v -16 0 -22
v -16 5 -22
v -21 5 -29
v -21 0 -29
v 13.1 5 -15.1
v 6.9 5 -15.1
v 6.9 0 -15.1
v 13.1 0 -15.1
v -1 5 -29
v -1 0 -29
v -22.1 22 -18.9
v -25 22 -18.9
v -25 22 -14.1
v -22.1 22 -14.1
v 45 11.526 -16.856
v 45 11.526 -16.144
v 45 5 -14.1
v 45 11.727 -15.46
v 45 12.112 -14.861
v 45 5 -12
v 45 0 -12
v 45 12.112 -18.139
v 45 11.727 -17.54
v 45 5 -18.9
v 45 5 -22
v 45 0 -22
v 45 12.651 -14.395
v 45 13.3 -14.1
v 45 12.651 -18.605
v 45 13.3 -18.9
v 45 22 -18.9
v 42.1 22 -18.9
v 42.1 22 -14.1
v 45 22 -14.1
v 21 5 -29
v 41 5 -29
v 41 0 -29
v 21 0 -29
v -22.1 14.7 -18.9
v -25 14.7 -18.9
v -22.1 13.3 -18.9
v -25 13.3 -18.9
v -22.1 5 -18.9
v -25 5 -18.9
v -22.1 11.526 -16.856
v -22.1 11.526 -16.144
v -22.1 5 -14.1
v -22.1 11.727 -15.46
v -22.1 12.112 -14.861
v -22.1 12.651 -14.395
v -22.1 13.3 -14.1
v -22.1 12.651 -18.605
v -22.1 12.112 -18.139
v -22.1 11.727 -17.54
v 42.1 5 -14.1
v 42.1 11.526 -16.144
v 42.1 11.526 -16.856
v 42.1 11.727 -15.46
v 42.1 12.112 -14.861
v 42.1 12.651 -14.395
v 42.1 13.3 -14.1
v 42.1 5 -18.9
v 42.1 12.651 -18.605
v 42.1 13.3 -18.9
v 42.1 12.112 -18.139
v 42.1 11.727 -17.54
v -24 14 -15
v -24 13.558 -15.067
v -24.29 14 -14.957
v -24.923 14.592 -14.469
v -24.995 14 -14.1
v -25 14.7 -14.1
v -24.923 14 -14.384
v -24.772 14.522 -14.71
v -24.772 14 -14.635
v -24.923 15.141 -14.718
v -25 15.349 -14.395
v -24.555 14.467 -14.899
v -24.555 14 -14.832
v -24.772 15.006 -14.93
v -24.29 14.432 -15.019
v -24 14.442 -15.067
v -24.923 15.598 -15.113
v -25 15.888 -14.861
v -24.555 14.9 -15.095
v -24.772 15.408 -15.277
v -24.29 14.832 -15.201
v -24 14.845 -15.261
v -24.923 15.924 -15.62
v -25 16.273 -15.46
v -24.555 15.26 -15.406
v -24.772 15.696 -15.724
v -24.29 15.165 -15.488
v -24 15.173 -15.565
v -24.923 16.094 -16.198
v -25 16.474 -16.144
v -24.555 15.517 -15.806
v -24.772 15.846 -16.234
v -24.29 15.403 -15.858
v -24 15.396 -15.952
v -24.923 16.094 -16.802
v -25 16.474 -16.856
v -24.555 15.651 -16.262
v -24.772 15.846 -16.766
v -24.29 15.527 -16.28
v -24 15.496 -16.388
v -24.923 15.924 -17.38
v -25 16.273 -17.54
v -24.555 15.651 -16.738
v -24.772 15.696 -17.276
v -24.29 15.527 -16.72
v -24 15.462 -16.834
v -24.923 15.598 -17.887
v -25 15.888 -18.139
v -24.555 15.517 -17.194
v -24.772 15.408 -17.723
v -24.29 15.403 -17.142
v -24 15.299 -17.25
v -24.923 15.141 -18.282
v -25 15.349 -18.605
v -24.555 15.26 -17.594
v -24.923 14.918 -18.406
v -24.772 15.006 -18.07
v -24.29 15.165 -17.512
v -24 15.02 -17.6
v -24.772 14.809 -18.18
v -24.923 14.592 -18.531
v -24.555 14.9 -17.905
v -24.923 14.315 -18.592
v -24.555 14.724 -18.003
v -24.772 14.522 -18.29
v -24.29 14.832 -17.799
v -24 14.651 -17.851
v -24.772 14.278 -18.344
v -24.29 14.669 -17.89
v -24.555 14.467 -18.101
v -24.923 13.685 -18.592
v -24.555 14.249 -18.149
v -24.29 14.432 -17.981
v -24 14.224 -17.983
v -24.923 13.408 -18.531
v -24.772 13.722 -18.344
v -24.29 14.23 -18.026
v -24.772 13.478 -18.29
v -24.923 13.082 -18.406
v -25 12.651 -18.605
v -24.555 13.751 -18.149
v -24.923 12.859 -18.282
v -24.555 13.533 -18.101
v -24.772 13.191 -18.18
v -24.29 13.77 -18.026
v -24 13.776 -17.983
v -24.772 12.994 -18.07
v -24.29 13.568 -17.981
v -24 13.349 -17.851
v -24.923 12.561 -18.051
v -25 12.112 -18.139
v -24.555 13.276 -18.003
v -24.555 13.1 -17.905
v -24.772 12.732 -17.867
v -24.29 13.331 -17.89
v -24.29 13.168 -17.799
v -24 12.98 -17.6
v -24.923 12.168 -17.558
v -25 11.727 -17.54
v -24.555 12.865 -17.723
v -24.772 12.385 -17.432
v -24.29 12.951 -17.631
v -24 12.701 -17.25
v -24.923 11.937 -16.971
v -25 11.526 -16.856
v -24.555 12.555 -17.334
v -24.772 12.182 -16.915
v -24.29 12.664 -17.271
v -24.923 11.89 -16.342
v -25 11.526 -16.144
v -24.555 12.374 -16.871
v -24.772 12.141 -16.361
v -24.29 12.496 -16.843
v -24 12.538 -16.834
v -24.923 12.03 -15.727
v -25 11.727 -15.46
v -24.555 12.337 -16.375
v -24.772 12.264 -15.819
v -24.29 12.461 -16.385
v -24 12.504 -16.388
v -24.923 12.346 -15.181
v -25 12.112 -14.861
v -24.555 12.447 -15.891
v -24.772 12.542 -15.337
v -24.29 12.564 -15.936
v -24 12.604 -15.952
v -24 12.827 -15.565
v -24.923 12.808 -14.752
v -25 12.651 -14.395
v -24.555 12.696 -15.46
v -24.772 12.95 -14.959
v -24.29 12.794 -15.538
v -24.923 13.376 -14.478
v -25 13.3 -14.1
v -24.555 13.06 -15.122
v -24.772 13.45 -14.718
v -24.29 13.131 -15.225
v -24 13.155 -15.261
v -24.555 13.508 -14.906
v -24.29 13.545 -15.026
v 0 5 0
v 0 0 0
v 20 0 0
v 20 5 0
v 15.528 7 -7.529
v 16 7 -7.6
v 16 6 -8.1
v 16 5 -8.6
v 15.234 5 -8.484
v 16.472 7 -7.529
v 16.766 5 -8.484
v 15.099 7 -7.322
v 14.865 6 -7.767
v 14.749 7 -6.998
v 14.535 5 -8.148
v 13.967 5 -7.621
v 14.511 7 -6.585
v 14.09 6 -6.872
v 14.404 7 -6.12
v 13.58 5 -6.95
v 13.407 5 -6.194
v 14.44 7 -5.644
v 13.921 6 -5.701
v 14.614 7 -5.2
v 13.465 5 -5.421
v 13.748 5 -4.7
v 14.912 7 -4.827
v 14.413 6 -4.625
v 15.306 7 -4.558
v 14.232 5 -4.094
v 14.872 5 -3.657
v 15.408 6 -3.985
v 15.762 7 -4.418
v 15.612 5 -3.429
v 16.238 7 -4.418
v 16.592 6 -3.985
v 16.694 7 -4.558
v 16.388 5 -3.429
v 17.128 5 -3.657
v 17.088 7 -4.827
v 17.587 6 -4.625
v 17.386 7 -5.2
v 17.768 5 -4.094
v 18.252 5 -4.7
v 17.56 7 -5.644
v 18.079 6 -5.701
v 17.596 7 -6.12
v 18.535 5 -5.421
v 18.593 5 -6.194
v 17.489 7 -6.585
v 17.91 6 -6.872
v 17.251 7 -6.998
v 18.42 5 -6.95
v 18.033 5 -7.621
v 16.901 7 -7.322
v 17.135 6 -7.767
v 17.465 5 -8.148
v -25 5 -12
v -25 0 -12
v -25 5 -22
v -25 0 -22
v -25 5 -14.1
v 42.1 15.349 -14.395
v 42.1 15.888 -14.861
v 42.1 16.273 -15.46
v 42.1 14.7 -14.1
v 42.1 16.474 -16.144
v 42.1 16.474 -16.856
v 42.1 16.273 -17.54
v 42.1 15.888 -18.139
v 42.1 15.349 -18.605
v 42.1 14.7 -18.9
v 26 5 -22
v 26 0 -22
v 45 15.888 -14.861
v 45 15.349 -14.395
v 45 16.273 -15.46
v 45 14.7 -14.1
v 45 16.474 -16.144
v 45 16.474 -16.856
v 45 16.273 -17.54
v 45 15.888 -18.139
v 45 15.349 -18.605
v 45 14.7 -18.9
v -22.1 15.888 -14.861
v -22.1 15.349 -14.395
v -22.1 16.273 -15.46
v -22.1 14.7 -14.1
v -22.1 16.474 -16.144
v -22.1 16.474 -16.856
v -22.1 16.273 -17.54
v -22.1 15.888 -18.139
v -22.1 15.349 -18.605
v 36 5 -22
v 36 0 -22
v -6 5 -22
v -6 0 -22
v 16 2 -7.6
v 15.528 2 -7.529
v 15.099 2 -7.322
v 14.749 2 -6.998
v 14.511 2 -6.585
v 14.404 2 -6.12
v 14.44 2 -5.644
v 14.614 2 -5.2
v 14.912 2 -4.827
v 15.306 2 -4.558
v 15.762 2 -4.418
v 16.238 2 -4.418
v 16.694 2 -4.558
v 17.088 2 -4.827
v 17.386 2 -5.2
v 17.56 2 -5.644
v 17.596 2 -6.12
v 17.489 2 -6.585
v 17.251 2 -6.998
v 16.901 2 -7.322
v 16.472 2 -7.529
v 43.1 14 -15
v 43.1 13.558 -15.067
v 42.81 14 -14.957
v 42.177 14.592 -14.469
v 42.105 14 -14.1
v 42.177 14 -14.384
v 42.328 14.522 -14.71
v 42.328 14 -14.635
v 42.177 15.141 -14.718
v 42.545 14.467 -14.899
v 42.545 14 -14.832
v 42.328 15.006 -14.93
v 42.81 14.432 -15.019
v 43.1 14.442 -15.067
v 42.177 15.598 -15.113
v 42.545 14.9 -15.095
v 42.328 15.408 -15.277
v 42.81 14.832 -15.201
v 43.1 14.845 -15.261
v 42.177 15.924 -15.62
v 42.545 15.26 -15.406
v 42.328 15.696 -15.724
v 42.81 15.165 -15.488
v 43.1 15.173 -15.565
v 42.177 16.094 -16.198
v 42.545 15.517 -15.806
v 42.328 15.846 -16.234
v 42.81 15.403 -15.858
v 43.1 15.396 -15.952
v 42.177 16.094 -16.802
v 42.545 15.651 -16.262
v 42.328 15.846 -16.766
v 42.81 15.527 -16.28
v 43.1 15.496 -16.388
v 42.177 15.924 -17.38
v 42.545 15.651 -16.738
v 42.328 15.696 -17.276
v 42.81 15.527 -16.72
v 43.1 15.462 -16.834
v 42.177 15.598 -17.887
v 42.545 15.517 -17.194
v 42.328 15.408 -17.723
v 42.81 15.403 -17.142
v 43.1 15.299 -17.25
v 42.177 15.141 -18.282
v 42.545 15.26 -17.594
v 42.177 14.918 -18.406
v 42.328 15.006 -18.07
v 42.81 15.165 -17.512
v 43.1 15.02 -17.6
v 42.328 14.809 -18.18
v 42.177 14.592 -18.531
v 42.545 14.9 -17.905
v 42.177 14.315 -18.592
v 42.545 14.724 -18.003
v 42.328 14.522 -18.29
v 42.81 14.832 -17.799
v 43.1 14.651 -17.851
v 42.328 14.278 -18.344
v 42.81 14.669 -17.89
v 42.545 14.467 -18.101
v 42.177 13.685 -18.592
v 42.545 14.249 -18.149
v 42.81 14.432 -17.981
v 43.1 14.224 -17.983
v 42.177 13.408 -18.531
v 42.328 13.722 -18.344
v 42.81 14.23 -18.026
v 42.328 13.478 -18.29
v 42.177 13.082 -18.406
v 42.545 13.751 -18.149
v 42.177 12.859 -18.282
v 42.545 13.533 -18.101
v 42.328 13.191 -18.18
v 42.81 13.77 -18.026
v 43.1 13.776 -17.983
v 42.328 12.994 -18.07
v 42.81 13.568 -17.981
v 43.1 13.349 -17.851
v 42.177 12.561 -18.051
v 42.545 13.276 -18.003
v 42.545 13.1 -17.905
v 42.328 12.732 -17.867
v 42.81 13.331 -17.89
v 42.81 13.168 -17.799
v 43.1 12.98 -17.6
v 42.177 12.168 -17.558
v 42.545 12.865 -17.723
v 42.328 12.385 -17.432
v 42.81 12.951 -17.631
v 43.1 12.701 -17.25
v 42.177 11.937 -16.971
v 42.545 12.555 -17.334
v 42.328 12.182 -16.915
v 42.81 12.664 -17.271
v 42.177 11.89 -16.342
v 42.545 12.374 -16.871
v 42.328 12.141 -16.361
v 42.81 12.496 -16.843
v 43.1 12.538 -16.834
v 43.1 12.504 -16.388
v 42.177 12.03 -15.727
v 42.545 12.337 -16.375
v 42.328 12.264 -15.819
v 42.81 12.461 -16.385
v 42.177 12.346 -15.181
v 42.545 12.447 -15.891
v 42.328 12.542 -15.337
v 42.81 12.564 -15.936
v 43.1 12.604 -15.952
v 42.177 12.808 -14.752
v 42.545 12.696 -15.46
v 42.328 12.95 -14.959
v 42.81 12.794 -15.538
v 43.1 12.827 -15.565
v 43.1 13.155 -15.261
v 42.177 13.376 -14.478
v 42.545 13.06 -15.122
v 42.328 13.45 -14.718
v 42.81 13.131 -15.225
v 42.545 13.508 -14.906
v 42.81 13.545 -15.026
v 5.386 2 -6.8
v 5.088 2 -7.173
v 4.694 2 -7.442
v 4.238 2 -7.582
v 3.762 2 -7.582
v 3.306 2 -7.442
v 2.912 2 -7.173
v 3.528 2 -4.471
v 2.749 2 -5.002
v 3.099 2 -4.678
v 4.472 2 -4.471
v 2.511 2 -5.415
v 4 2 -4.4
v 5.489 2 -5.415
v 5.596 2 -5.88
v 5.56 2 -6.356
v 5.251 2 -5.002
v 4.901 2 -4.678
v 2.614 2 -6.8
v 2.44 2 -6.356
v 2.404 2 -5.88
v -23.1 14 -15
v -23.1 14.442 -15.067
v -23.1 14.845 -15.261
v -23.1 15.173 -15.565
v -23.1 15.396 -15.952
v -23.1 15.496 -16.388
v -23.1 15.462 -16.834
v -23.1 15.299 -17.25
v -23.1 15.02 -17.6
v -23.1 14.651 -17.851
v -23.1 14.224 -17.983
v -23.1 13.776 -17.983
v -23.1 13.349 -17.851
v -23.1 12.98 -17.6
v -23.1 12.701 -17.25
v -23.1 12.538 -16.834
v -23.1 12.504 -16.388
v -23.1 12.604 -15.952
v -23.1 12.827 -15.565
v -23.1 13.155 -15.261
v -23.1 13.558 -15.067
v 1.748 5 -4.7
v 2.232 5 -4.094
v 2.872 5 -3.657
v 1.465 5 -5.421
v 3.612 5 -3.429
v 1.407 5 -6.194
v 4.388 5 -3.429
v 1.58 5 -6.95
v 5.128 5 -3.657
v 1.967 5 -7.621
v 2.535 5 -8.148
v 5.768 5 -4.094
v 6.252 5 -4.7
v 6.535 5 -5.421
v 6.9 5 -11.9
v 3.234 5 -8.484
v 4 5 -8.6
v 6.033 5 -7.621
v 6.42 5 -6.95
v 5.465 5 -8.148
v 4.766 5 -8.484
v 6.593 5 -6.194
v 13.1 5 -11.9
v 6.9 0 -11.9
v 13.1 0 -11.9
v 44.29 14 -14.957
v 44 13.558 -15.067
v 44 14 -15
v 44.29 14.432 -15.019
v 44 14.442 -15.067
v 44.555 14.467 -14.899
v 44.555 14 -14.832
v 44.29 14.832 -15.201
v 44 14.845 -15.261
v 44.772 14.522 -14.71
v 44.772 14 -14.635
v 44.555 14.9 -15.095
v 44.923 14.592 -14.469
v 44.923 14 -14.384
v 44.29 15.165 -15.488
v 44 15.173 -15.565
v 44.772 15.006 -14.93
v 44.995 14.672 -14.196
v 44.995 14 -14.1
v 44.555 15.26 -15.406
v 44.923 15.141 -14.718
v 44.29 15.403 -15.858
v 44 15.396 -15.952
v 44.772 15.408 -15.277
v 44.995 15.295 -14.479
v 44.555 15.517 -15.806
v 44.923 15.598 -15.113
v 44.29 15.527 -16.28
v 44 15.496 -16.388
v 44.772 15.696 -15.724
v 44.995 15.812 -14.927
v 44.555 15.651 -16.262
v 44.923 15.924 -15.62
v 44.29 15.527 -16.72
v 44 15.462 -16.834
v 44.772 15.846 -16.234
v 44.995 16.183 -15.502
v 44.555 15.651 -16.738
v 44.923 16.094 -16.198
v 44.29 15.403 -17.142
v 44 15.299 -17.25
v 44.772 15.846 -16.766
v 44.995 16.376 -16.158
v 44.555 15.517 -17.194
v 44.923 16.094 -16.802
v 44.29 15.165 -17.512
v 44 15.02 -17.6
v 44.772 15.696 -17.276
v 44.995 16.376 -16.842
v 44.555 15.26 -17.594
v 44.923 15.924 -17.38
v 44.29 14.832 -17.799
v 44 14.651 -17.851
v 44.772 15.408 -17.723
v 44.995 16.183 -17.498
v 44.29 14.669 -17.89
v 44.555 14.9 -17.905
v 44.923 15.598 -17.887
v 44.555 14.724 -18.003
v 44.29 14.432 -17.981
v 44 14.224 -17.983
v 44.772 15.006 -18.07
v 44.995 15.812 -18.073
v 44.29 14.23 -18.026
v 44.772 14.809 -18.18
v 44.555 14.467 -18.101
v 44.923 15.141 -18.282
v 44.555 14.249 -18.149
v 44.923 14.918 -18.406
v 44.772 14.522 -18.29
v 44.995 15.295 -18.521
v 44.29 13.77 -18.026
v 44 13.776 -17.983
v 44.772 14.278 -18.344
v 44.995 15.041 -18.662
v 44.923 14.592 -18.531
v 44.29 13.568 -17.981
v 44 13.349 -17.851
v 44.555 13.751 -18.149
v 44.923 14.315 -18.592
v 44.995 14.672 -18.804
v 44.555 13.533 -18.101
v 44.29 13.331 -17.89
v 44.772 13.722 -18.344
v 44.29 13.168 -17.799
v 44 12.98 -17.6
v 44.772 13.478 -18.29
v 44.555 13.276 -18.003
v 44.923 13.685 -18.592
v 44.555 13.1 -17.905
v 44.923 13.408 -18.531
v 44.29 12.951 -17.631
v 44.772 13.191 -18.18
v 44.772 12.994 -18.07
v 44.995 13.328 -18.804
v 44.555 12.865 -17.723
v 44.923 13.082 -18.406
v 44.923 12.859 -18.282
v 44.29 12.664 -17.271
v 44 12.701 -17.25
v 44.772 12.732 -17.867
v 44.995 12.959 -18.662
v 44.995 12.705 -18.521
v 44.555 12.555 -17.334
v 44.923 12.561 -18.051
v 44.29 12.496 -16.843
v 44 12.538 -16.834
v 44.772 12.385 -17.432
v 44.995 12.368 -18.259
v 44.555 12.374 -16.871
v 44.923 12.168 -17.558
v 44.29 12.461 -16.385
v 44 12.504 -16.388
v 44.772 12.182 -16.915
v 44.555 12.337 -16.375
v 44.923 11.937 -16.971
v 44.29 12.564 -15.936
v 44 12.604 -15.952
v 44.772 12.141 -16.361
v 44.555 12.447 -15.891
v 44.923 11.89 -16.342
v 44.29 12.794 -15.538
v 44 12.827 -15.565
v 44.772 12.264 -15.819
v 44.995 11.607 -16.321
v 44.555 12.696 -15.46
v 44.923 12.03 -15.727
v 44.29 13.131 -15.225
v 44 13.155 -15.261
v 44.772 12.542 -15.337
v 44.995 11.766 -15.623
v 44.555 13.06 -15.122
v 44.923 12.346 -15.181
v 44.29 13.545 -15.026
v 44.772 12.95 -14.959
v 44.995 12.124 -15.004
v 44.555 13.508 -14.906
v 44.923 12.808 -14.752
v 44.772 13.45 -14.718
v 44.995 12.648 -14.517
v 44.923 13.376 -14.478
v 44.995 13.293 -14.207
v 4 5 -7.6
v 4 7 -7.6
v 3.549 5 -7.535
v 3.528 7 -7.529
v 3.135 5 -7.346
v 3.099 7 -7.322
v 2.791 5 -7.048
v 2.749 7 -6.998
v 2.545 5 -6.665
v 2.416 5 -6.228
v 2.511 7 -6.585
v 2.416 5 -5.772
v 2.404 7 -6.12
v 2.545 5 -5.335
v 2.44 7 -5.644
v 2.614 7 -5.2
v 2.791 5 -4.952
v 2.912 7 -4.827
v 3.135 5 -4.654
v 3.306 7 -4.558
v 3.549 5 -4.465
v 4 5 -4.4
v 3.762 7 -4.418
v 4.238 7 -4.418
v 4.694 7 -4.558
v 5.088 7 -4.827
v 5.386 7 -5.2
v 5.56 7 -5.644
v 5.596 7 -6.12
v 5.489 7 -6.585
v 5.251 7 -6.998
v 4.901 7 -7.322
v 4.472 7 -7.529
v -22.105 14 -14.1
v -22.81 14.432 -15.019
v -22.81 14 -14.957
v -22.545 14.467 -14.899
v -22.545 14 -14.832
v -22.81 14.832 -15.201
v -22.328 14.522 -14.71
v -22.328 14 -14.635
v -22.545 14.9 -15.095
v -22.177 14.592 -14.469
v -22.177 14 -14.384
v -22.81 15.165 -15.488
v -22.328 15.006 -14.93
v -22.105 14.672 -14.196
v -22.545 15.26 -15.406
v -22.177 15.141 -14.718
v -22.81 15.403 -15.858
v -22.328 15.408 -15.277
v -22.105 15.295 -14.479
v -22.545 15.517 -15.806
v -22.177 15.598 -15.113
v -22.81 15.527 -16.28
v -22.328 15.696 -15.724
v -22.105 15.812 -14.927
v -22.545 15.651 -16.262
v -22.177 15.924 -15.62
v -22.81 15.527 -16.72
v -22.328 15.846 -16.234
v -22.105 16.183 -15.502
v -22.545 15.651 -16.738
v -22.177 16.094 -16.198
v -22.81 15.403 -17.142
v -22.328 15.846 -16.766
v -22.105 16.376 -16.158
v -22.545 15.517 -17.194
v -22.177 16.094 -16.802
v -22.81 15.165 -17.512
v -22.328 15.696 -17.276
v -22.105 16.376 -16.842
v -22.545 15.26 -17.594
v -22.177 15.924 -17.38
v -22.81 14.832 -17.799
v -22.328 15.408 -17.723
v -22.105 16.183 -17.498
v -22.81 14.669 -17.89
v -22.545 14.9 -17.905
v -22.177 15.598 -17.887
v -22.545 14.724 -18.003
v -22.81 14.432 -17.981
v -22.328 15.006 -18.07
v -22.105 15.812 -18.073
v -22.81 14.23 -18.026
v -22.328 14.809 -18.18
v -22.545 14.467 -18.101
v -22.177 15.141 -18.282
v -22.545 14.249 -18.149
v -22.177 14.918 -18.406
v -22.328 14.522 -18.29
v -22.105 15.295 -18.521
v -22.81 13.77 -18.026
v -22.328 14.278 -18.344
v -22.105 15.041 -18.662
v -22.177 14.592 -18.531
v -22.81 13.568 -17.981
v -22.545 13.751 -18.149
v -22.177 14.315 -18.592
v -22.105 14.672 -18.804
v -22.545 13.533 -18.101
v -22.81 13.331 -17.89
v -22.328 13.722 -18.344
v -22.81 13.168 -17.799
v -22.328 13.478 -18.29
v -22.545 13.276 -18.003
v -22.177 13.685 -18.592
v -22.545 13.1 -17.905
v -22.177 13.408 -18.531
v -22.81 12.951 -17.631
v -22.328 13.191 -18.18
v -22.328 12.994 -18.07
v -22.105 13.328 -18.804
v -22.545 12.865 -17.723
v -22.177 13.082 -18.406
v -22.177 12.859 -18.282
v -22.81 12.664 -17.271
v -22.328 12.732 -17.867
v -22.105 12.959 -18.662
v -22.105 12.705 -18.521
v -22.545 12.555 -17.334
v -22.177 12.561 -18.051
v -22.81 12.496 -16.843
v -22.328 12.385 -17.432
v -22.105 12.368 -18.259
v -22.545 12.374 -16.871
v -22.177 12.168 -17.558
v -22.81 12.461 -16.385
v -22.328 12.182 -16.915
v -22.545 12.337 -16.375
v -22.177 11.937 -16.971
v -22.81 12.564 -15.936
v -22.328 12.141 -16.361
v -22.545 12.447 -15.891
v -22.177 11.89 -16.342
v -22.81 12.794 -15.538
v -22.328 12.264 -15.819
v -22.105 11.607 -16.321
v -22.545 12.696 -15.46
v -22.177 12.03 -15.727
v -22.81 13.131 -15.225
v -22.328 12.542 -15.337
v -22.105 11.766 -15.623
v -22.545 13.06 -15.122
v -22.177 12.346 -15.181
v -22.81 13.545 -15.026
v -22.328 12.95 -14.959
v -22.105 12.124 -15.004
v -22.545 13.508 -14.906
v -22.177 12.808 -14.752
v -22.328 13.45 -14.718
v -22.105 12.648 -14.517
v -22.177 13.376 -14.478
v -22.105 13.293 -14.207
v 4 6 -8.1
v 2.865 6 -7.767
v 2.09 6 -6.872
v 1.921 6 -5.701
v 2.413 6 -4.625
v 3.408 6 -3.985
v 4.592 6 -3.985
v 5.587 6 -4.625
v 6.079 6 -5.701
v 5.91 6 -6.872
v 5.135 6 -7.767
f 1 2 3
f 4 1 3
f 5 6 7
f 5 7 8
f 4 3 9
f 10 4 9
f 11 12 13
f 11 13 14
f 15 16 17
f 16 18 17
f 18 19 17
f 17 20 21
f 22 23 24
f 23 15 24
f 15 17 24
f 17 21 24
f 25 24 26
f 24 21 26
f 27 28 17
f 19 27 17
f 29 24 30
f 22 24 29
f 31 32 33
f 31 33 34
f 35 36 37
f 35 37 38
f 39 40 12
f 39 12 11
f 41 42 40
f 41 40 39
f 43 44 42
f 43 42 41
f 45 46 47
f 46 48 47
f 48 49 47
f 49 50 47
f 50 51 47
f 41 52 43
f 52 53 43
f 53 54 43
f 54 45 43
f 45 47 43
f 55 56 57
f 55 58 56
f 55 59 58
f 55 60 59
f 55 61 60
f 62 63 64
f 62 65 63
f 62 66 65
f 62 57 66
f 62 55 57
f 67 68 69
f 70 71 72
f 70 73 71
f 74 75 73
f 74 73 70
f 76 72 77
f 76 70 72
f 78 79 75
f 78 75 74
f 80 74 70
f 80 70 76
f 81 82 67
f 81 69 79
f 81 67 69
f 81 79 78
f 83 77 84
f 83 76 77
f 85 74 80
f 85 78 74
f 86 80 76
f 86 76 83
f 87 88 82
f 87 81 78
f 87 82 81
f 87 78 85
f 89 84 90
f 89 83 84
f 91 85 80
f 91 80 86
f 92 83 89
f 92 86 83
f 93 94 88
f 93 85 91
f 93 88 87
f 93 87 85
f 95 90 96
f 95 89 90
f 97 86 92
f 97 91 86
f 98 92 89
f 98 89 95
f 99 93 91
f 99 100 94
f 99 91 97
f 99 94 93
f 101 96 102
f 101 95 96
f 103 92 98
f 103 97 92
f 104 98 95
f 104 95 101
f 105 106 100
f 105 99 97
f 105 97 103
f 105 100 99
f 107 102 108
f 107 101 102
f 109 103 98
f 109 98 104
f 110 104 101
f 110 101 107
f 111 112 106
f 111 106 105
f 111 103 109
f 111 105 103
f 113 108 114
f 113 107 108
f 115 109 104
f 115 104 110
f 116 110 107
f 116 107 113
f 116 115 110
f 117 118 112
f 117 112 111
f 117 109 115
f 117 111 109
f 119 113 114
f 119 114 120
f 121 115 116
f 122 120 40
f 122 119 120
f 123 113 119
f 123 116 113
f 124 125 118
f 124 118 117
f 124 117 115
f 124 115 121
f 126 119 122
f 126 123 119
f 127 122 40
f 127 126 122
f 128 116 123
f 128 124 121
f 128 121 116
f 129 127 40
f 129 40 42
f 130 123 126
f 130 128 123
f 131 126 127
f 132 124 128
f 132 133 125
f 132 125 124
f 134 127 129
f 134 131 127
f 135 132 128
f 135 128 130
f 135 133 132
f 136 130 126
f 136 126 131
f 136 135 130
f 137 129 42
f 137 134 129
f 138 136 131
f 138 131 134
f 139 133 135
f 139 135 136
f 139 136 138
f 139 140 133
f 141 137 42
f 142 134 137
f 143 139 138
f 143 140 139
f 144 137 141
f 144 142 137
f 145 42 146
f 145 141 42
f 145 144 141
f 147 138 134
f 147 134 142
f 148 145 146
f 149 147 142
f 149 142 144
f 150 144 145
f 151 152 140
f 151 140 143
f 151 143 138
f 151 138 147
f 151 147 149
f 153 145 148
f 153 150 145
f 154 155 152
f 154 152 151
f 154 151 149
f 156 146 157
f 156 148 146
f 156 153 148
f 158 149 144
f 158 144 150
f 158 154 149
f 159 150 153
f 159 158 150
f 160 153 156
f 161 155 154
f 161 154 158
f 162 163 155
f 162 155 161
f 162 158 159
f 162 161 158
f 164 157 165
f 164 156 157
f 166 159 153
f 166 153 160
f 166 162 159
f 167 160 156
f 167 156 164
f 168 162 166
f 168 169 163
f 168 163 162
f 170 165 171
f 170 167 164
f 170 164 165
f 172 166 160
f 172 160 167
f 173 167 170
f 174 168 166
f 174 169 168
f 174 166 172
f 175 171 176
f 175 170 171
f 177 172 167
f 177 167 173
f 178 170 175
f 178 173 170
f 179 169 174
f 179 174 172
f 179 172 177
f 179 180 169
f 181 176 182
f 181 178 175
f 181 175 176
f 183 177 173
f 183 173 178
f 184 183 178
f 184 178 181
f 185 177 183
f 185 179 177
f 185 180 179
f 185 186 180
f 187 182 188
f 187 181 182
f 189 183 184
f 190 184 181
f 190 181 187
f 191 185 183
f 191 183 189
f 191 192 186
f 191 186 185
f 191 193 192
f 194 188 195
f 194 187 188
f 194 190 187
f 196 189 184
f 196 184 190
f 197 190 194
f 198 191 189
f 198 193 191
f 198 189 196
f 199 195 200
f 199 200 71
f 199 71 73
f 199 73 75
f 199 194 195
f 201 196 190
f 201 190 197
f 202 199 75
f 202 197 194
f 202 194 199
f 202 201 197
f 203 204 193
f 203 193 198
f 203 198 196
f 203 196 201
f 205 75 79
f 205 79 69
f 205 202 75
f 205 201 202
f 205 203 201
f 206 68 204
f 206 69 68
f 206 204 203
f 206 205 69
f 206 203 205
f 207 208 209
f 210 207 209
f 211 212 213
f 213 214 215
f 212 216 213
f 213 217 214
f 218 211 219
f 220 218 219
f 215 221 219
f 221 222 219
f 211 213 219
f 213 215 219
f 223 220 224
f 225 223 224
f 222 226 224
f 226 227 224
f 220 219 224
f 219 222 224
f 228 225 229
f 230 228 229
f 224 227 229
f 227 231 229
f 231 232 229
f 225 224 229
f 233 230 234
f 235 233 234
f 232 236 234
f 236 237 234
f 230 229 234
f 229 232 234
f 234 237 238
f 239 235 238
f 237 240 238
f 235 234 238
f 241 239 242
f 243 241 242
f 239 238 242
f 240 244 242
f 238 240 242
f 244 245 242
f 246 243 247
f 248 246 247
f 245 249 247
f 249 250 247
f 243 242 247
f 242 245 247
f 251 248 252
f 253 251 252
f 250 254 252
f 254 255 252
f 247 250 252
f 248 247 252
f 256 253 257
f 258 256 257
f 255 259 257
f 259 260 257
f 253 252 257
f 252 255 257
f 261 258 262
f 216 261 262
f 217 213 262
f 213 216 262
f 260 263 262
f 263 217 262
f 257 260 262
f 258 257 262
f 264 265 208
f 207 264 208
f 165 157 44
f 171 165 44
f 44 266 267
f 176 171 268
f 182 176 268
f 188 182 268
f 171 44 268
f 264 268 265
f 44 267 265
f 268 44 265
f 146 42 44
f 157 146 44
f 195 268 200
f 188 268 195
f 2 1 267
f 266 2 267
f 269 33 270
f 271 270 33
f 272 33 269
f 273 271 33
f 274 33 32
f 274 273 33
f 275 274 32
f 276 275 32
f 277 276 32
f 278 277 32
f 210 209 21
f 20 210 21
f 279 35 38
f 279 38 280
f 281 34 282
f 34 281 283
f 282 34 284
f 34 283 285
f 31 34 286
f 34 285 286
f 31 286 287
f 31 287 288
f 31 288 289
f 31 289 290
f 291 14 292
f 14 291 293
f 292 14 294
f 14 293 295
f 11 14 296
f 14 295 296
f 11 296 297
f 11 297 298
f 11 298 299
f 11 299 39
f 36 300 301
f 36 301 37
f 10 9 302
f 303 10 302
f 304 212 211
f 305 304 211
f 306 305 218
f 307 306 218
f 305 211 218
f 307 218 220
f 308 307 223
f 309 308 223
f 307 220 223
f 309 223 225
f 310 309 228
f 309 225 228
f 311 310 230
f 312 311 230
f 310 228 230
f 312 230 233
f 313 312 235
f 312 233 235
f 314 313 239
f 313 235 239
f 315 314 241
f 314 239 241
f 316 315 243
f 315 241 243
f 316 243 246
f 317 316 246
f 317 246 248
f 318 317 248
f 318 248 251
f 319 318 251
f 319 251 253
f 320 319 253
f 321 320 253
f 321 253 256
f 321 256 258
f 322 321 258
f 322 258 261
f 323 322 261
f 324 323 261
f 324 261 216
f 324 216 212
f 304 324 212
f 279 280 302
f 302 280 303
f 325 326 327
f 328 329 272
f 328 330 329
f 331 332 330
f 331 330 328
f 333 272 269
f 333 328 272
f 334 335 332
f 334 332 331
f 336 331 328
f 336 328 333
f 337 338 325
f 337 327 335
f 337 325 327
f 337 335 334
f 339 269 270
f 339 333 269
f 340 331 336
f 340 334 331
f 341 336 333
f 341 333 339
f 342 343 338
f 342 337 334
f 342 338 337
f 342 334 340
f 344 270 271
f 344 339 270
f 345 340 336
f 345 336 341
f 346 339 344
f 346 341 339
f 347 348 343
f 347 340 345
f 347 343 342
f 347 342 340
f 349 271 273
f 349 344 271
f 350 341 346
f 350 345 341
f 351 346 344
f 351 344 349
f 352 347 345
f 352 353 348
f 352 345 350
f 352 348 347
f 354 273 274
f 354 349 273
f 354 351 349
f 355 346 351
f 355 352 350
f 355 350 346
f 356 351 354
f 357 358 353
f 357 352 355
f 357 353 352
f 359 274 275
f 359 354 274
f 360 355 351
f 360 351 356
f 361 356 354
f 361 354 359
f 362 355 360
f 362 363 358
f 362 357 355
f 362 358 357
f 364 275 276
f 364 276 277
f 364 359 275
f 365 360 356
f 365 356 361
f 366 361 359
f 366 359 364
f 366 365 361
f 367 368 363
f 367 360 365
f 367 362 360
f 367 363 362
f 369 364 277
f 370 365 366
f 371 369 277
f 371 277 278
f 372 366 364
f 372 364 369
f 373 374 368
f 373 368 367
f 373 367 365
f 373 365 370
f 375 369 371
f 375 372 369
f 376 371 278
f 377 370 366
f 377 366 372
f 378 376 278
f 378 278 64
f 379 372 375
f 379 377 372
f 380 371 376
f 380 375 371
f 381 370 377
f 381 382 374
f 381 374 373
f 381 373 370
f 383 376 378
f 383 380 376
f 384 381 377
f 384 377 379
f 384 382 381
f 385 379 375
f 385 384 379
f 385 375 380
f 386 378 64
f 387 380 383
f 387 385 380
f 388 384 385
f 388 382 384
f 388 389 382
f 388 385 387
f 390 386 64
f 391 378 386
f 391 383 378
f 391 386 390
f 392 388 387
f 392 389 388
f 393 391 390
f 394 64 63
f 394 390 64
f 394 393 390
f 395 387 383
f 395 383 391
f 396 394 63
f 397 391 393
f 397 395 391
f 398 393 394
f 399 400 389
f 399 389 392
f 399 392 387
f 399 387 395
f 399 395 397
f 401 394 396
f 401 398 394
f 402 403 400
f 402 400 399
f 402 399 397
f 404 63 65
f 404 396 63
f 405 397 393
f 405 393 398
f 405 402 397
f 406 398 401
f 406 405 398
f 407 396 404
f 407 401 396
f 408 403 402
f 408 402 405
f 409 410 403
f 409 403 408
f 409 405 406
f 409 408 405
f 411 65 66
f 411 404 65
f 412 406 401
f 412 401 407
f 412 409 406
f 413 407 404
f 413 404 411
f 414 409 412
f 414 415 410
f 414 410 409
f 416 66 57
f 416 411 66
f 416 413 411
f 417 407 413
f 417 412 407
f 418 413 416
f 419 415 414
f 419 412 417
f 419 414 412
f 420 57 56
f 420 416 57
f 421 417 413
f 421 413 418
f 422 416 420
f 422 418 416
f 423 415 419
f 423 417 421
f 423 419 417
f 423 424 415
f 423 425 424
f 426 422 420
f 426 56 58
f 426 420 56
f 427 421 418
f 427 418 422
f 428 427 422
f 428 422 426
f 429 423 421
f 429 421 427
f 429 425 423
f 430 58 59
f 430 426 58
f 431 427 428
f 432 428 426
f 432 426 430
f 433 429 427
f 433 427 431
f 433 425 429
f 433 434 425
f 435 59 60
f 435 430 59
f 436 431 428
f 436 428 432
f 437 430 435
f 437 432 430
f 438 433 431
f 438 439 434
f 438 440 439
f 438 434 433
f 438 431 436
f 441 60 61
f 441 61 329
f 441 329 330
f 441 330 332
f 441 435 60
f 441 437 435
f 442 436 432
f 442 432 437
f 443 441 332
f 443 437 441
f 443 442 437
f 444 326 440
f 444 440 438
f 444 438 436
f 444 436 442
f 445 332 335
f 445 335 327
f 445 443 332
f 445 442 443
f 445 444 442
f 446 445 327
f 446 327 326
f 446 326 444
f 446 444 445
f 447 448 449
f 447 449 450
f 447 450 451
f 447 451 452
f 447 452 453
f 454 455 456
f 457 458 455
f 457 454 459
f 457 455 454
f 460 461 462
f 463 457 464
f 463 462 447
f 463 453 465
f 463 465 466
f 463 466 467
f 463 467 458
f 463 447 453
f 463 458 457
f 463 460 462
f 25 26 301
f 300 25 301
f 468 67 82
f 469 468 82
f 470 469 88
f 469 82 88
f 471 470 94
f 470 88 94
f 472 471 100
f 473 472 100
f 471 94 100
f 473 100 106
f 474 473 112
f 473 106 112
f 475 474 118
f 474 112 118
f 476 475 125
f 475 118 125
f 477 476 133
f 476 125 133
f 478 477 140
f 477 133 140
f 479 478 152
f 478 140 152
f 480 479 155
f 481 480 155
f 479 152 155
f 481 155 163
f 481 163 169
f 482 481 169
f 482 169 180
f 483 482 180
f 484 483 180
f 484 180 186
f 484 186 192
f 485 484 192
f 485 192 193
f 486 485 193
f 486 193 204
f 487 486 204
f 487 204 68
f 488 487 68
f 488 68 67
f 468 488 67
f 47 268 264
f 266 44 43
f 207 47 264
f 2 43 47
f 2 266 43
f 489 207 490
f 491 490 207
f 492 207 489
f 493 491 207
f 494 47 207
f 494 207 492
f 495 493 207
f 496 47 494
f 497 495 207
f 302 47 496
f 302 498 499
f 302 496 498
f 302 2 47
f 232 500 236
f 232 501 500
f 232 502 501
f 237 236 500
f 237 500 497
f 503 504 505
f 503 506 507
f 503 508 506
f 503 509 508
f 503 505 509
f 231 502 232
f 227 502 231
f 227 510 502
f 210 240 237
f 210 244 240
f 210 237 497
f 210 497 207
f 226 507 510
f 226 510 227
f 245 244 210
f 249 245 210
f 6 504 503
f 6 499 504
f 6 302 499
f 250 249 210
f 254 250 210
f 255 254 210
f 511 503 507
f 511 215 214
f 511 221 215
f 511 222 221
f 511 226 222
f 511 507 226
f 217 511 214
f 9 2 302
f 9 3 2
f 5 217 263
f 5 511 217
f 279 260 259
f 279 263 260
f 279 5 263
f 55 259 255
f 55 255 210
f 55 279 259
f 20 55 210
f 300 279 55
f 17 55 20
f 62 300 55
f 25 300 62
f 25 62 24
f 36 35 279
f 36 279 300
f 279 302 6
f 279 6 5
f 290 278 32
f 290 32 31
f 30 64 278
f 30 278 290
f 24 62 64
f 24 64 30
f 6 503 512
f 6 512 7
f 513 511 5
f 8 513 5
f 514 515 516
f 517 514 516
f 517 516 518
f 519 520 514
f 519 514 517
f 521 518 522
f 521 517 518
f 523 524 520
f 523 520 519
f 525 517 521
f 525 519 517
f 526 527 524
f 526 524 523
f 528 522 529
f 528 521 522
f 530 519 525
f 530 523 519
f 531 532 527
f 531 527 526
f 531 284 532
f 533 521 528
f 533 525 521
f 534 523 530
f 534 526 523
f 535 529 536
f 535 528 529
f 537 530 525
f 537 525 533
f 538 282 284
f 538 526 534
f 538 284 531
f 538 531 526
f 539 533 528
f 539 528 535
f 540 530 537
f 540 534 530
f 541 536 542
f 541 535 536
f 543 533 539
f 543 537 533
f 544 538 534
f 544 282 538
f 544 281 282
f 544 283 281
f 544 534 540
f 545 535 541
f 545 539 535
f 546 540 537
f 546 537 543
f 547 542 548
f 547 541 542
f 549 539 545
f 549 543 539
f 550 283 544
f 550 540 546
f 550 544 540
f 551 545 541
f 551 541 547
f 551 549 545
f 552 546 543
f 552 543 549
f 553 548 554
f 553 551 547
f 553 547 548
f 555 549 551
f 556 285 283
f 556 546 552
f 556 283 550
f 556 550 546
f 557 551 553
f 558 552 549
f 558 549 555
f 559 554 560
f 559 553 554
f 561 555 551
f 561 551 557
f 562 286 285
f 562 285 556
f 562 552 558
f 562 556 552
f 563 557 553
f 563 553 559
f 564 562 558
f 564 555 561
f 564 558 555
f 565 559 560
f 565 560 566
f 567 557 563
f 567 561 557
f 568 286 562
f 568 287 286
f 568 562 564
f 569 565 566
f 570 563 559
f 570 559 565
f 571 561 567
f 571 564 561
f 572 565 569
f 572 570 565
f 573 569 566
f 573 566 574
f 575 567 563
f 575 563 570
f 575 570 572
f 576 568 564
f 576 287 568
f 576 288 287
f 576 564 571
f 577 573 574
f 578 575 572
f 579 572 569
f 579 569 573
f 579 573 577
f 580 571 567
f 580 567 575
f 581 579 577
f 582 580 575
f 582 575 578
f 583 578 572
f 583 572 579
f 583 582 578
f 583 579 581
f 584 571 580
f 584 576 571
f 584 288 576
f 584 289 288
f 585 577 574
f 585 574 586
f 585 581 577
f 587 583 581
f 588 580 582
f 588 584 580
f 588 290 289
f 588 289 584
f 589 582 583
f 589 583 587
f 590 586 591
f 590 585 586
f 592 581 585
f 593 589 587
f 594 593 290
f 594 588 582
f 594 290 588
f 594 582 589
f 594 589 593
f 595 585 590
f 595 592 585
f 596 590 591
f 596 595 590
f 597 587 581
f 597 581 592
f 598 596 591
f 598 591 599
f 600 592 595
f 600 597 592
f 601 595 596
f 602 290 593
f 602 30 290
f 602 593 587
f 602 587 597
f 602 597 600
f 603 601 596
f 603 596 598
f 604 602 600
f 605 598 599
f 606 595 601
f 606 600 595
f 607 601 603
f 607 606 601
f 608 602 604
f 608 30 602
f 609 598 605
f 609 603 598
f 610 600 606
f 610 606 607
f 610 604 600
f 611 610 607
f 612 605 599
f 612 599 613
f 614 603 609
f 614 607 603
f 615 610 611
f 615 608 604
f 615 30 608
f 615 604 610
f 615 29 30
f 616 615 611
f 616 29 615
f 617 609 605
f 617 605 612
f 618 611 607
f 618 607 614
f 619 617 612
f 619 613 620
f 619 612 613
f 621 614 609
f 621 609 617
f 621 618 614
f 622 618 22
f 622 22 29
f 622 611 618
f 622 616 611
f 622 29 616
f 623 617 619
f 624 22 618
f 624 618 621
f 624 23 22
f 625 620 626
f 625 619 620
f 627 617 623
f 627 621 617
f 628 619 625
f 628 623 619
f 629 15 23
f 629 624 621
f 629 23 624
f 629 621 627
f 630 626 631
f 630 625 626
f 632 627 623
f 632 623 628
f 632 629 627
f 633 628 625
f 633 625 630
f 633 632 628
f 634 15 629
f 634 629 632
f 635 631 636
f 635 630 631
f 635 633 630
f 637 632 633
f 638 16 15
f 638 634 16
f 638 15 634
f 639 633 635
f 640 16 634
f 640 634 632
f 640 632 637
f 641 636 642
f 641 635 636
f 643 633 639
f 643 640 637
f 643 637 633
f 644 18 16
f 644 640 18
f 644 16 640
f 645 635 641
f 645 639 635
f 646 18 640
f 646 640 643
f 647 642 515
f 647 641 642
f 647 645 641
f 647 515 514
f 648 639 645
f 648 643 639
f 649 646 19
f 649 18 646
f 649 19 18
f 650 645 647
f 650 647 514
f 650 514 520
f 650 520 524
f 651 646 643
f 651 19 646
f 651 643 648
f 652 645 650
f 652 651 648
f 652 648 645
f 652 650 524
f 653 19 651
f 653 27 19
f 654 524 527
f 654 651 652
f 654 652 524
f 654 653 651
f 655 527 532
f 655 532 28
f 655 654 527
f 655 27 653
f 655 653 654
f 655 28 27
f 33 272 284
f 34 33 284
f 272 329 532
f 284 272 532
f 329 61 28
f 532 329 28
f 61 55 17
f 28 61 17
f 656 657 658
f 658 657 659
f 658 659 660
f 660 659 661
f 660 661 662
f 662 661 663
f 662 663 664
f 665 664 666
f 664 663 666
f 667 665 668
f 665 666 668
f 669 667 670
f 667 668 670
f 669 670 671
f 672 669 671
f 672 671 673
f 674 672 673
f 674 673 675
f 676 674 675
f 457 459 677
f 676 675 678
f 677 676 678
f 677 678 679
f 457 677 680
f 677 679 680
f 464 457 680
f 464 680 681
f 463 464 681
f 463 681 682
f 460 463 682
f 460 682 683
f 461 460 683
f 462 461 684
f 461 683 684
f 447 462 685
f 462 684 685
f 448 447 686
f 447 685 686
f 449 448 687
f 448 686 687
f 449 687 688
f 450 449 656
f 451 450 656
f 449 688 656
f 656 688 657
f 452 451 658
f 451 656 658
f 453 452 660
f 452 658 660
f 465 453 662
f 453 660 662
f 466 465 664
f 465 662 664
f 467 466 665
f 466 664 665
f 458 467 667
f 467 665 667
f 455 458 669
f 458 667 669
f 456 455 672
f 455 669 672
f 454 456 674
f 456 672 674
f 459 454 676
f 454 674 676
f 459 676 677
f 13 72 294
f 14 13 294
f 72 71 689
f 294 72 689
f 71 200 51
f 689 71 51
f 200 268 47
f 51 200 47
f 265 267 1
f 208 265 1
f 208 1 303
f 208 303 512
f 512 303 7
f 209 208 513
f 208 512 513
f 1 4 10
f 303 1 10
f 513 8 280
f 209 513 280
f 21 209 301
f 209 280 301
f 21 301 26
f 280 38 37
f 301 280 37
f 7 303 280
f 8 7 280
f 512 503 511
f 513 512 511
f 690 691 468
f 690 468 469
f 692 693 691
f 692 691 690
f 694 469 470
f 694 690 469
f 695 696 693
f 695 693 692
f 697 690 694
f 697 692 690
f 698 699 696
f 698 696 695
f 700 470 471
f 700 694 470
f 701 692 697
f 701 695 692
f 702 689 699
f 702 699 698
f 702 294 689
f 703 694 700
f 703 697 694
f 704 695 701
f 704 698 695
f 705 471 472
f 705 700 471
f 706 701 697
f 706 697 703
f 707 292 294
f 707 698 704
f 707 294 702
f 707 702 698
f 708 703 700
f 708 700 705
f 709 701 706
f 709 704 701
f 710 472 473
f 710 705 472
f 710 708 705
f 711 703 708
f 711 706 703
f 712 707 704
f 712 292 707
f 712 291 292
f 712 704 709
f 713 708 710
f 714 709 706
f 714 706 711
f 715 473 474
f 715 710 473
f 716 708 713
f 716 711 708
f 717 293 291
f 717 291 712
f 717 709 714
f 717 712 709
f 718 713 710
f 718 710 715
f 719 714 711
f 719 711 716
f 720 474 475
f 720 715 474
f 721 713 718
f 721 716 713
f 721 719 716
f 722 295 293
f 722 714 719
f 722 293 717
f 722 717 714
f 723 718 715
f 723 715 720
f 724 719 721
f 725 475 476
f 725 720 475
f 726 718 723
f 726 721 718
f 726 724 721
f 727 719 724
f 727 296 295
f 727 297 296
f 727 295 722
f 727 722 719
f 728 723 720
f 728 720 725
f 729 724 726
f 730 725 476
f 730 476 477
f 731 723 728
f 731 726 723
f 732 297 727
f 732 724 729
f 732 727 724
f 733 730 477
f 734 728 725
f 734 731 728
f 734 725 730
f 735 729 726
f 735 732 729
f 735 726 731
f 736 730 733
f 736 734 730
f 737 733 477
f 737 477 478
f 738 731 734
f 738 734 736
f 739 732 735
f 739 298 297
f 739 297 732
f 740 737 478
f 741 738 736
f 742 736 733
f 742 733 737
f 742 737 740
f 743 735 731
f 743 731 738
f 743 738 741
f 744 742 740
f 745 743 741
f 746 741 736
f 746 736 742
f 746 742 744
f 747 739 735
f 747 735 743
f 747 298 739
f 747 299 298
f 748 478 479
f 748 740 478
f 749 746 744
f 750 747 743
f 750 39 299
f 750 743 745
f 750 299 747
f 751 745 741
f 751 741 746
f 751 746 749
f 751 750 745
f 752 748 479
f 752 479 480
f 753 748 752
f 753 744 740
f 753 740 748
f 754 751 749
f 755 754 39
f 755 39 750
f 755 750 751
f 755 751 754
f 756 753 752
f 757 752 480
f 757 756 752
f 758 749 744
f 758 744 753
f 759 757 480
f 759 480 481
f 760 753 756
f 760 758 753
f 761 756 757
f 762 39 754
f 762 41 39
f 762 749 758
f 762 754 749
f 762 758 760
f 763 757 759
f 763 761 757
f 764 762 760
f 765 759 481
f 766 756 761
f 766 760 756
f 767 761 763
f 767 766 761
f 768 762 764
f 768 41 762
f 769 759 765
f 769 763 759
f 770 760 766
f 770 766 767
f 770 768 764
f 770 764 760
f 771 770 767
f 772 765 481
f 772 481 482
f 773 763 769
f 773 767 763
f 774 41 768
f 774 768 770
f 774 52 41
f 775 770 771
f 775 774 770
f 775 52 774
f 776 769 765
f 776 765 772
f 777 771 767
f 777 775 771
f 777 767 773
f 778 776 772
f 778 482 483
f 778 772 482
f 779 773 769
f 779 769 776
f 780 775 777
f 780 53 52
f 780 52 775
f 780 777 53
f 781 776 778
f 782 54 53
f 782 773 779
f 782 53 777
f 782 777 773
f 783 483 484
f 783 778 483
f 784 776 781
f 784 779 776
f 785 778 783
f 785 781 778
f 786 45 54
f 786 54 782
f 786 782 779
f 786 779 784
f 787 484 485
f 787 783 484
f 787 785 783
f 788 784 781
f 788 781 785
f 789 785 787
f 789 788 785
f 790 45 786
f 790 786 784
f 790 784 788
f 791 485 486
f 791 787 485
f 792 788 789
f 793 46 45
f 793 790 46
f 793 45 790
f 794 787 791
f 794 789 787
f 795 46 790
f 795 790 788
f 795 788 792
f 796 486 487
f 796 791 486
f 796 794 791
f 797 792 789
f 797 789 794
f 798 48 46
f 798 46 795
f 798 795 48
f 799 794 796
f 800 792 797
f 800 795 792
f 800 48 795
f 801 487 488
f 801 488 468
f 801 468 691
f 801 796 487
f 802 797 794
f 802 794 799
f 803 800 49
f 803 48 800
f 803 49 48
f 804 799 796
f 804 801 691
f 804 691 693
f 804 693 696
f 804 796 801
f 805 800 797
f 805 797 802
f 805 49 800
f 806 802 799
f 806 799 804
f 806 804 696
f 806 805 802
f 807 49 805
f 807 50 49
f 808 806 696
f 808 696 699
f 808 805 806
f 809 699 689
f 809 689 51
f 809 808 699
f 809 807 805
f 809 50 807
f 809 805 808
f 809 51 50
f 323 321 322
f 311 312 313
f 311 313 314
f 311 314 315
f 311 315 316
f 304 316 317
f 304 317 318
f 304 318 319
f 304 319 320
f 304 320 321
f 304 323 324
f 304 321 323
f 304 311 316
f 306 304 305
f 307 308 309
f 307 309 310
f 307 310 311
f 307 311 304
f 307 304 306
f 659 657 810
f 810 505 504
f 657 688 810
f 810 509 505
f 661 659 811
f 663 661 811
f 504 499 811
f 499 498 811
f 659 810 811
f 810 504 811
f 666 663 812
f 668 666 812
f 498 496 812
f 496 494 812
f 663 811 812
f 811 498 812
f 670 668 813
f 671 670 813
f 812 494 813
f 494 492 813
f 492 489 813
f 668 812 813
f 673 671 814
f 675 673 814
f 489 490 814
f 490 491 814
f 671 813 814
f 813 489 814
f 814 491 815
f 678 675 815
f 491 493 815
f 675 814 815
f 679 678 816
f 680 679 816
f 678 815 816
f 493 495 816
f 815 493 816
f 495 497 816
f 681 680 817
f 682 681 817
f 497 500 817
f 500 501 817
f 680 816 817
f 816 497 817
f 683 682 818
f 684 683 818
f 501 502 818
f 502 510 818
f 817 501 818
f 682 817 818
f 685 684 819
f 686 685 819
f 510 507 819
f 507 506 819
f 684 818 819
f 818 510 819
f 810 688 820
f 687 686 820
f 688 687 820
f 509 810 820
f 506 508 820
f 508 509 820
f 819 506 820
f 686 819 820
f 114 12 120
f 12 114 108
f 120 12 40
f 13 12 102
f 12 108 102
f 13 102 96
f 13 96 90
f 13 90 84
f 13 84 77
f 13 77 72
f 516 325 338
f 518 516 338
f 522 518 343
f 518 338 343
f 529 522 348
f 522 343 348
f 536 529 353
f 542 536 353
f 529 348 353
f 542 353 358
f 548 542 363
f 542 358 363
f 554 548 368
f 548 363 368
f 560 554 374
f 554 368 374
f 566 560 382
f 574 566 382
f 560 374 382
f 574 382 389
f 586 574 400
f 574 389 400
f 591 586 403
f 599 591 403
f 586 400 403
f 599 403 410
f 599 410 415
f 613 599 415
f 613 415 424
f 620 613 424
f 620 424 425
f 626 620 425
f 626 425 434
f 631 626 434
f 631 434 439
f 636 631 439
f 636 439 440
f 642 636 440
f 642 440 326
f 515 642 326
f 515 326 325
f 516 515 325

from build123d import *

# Parameters (mm, degrees)
BOSS_EXTRUDE1_DEPTH = 5
SKETCH2_R           = 1.6
CUT_EXTRUDE1_DEPTH  = 3
SKETCH10_W          = 2.9
SKETCH10_H          = 4.8
BOSS_EXTRUDE2_DEPTH = 17
SKETCH9_W           = 6.2
SKETCH9_H           = 3.2
CUT_EXTRUDE4_DEPTH  = 5
SKETCH11_R          = 1.5
CUT_EXTRUDE5_DEPTH  = 70
FILLET3_R           = 1
FILLET4_R           = 1
FILLET6_R           = 1
FILLET7_R           = 1
BOSS_EXTRUDE4_DEPTH = 5


with BuildPart() as part:
    # Sketch1 → Boss-Extrude1 (new body)
    with BuildSketch(Plane(origin=(0, 0, 0), x_dir=(1, 0, 0), z_dir=(0, 1, 0))):
        Polygon((0, 0), (20, 0), (45, 12), (45, 22), (-25, 22), (-25, 12), align=None)
    extrude(amount=BOSS_EXTRUDE1_DEPTH)

    # Sketch2 → Cut-Extrude1 (cut)
    with BuildSketch(Plane(origin=(0, 5, 0), x_dir=(1, 0, 0), z_dir=(0, 1, 0))):
        with Locations(Location((4, 6, 0), (0, 0, 270))):
            Circle(SKETCH2_R)
        with Locations(Location((16, 6, 0), (0, 0, 90))):
            Circle(SKETCH2_R)
    extrude(amount=-CUT_EXTRUDE1_DEPTH, mode=Mode.SUBTRACT)

    # Sketch6 → Revolve1 (revolve)
    with BuildSketch(Plane.XY.offset(-6), mode=Mode.PRIVATE) as revolve1_sk:
        Polygon((2.4, 5), (2.4, 7), (1.4, 5), align=None)
    revolve(revolve1_sk.sketch.rotate(Axis((4, 5, -6), (0, 1, 0)), 270), axis=Axis((4, 5, -6), (0, 1, 0)))

    # Sketch7 → Revolve2 (revolve)
    with BuildSketch(Plane.XY.offset(-6), mode=Mode.PRIVATE) as revolve2_sk:
        Polygon((14.4, 5), (14.4, 7), (13.4, 5), align=None)
    revolve(revolve2_sk.sketch.rotate(Axis((16, 5, -6), (0, 1, 0)), 270), axis=Axis((16, 5, -6), (0, 1, 0)))

    # Sketch10 → Boss-Extrude2 (add)
    with BuildSketch(Plane(origin=(0, 5, 0), x_dir=(1, 0, 0), z_dir=(0, 1, 0))):
        with Locations((-23.55, 16.5)):
            Rectangle(SKETCH10_W, SKETCH10_H)
        with Locations((43.55, 16.5)):
            Rectangle(SKETCH10_W, SKETCH10_H)
    extrude(amount=BOSS_EXTRUDE2_DEPTH)

    # Sketch9 → Cut-Extrude4 (cut)
    with BuildSketch(Plane(origin=(0, 5, 0), x_dir=(1, 0, 0), z_dir=(0, 1, 0))):
        with Locations((10, 13.5)):
            Rectangle(SKETCH9_W, SKETCH9_H)
    extrude(amount=-CUT_EXTRUDE4_DEPTH, mode=Mode.SUBTRACT)

    # Sketch11 → Cut-Extrude5 (cut)
    with BuildSketch(Plane.ZY.offset(25)):
        with Locations((-16.5, 14)):
            Circle(SKETCH11_R)
    extrude(amount=-CUT_EXTRUDE5_DEPTH, mode=Mode.SUBTRACT)

    # Fillet3
    # the kernel refuses this fillet: 1 mm, written as the material it takes off along each edge
    with BuildSketch(Plane(origin=(-25, 14, -16.5), x_dir=(0, 0, 1), z_dir=(0, -1, 0))) as fillet3_piece_1:
        with BuildLine():
            CenterArc((1.5 + FILLET3_R, -FILLET3_R), FILLET3_R, 90, 90)
            Line((1.5, -FILLET3_R), (1.5, 0))
            Line((1.5, 0), (1.5 + FILLET3_R, 0))
        make_face()
    revolve(axis=Axis((-25, 14, -16.5), (-1, 0, 0)), mode=Mode.SUBTRACT)

    # Fillet4
    # the kernel refuses this fillet: 1 mm, written as the material it takes off along each edge
    with BuildSketch(Plane(origin=(-22.1, 14, -16.5), x_dir=(0, 0, 1), z_dir=(0, -1, 0))) as fillet4_piece_1:
        with BuildLine():
            CenterArc((1.5 + FILLET4_R, FILLET4_R), FILLET4_R, 180, 90)
            Line((1.5, FILLET4_R), (1.5, 0))
            Line((1.5, 0), (1.5 + FILLET4_R, 0))
        make_face()
    revolve(axis=Axis((-22.1, 14, -16.5), (-1, 0, 0)), mode=Mode.SUBTRACT)

    # Fillet6
    # the kernel refuses this fillet: 1 mm, written as the material it takes off along each edge
    with BuildSketch(Plane(origin=(42.1, 14, -16.5), x_dir=(0, 0, 1), z_dir=(0, -1, 0))) as fillet6_piece_1:
        with BuildLine():
            CenterArc((1.5 + FILLET6_R, -FILLET6_R), FILLET6_R, 90, 90)
            Line((1.5, -FILLET6_R), (1.5, 0))
            Line((1.5, 0), (1.5 + FILLET6_R, 0))
        make_face()
    revolve(axis=Axis((42.1, 14, -16.5), (-1, 0, 0)), mode=Mode.SUBTRACT)

    # Fillet7
    # the kernel refuses this fillet: 1 mm, written as the material it takes off along each edge
    with BuildSketch(Plane(origin=(45, 14, -16.5), x_dir=(0, 0, 1), z_dir=(0, -1, 0))) as fillet7_piece_1:
        with BuildLine():
            CenterArc((1.5 + FILLET7_R, FILLET7_R), FILLET7_R, 180, 90)
            Line((1.5, FILLET7_R), (1.5, 0))
            Line((1.5, 0), (1.5 + FILLET7_R, 0))
        make_face()
    revolve(axis=Axis((45, 14, -16.5), (-1, 0, 0)), mode=Mode.SUBTRACT)

    # Sketch13 → Boss-Extrude4 (add)
    with BuildSketch(Plane(origin=(0, 5, 0), x_dir=(1, 0, 0), z_dir=(0, 1, 0))):
        Polygon((-16, 22), (-21, 29), (-1, 29), (-6, 22), align=None)
        Polygon((21, 29), (26, 22), (36, 22), (41, 29), align=None)
    extrude(amount=-BOSS_EXTRUDE4_DEPTH)


solid = part.part
